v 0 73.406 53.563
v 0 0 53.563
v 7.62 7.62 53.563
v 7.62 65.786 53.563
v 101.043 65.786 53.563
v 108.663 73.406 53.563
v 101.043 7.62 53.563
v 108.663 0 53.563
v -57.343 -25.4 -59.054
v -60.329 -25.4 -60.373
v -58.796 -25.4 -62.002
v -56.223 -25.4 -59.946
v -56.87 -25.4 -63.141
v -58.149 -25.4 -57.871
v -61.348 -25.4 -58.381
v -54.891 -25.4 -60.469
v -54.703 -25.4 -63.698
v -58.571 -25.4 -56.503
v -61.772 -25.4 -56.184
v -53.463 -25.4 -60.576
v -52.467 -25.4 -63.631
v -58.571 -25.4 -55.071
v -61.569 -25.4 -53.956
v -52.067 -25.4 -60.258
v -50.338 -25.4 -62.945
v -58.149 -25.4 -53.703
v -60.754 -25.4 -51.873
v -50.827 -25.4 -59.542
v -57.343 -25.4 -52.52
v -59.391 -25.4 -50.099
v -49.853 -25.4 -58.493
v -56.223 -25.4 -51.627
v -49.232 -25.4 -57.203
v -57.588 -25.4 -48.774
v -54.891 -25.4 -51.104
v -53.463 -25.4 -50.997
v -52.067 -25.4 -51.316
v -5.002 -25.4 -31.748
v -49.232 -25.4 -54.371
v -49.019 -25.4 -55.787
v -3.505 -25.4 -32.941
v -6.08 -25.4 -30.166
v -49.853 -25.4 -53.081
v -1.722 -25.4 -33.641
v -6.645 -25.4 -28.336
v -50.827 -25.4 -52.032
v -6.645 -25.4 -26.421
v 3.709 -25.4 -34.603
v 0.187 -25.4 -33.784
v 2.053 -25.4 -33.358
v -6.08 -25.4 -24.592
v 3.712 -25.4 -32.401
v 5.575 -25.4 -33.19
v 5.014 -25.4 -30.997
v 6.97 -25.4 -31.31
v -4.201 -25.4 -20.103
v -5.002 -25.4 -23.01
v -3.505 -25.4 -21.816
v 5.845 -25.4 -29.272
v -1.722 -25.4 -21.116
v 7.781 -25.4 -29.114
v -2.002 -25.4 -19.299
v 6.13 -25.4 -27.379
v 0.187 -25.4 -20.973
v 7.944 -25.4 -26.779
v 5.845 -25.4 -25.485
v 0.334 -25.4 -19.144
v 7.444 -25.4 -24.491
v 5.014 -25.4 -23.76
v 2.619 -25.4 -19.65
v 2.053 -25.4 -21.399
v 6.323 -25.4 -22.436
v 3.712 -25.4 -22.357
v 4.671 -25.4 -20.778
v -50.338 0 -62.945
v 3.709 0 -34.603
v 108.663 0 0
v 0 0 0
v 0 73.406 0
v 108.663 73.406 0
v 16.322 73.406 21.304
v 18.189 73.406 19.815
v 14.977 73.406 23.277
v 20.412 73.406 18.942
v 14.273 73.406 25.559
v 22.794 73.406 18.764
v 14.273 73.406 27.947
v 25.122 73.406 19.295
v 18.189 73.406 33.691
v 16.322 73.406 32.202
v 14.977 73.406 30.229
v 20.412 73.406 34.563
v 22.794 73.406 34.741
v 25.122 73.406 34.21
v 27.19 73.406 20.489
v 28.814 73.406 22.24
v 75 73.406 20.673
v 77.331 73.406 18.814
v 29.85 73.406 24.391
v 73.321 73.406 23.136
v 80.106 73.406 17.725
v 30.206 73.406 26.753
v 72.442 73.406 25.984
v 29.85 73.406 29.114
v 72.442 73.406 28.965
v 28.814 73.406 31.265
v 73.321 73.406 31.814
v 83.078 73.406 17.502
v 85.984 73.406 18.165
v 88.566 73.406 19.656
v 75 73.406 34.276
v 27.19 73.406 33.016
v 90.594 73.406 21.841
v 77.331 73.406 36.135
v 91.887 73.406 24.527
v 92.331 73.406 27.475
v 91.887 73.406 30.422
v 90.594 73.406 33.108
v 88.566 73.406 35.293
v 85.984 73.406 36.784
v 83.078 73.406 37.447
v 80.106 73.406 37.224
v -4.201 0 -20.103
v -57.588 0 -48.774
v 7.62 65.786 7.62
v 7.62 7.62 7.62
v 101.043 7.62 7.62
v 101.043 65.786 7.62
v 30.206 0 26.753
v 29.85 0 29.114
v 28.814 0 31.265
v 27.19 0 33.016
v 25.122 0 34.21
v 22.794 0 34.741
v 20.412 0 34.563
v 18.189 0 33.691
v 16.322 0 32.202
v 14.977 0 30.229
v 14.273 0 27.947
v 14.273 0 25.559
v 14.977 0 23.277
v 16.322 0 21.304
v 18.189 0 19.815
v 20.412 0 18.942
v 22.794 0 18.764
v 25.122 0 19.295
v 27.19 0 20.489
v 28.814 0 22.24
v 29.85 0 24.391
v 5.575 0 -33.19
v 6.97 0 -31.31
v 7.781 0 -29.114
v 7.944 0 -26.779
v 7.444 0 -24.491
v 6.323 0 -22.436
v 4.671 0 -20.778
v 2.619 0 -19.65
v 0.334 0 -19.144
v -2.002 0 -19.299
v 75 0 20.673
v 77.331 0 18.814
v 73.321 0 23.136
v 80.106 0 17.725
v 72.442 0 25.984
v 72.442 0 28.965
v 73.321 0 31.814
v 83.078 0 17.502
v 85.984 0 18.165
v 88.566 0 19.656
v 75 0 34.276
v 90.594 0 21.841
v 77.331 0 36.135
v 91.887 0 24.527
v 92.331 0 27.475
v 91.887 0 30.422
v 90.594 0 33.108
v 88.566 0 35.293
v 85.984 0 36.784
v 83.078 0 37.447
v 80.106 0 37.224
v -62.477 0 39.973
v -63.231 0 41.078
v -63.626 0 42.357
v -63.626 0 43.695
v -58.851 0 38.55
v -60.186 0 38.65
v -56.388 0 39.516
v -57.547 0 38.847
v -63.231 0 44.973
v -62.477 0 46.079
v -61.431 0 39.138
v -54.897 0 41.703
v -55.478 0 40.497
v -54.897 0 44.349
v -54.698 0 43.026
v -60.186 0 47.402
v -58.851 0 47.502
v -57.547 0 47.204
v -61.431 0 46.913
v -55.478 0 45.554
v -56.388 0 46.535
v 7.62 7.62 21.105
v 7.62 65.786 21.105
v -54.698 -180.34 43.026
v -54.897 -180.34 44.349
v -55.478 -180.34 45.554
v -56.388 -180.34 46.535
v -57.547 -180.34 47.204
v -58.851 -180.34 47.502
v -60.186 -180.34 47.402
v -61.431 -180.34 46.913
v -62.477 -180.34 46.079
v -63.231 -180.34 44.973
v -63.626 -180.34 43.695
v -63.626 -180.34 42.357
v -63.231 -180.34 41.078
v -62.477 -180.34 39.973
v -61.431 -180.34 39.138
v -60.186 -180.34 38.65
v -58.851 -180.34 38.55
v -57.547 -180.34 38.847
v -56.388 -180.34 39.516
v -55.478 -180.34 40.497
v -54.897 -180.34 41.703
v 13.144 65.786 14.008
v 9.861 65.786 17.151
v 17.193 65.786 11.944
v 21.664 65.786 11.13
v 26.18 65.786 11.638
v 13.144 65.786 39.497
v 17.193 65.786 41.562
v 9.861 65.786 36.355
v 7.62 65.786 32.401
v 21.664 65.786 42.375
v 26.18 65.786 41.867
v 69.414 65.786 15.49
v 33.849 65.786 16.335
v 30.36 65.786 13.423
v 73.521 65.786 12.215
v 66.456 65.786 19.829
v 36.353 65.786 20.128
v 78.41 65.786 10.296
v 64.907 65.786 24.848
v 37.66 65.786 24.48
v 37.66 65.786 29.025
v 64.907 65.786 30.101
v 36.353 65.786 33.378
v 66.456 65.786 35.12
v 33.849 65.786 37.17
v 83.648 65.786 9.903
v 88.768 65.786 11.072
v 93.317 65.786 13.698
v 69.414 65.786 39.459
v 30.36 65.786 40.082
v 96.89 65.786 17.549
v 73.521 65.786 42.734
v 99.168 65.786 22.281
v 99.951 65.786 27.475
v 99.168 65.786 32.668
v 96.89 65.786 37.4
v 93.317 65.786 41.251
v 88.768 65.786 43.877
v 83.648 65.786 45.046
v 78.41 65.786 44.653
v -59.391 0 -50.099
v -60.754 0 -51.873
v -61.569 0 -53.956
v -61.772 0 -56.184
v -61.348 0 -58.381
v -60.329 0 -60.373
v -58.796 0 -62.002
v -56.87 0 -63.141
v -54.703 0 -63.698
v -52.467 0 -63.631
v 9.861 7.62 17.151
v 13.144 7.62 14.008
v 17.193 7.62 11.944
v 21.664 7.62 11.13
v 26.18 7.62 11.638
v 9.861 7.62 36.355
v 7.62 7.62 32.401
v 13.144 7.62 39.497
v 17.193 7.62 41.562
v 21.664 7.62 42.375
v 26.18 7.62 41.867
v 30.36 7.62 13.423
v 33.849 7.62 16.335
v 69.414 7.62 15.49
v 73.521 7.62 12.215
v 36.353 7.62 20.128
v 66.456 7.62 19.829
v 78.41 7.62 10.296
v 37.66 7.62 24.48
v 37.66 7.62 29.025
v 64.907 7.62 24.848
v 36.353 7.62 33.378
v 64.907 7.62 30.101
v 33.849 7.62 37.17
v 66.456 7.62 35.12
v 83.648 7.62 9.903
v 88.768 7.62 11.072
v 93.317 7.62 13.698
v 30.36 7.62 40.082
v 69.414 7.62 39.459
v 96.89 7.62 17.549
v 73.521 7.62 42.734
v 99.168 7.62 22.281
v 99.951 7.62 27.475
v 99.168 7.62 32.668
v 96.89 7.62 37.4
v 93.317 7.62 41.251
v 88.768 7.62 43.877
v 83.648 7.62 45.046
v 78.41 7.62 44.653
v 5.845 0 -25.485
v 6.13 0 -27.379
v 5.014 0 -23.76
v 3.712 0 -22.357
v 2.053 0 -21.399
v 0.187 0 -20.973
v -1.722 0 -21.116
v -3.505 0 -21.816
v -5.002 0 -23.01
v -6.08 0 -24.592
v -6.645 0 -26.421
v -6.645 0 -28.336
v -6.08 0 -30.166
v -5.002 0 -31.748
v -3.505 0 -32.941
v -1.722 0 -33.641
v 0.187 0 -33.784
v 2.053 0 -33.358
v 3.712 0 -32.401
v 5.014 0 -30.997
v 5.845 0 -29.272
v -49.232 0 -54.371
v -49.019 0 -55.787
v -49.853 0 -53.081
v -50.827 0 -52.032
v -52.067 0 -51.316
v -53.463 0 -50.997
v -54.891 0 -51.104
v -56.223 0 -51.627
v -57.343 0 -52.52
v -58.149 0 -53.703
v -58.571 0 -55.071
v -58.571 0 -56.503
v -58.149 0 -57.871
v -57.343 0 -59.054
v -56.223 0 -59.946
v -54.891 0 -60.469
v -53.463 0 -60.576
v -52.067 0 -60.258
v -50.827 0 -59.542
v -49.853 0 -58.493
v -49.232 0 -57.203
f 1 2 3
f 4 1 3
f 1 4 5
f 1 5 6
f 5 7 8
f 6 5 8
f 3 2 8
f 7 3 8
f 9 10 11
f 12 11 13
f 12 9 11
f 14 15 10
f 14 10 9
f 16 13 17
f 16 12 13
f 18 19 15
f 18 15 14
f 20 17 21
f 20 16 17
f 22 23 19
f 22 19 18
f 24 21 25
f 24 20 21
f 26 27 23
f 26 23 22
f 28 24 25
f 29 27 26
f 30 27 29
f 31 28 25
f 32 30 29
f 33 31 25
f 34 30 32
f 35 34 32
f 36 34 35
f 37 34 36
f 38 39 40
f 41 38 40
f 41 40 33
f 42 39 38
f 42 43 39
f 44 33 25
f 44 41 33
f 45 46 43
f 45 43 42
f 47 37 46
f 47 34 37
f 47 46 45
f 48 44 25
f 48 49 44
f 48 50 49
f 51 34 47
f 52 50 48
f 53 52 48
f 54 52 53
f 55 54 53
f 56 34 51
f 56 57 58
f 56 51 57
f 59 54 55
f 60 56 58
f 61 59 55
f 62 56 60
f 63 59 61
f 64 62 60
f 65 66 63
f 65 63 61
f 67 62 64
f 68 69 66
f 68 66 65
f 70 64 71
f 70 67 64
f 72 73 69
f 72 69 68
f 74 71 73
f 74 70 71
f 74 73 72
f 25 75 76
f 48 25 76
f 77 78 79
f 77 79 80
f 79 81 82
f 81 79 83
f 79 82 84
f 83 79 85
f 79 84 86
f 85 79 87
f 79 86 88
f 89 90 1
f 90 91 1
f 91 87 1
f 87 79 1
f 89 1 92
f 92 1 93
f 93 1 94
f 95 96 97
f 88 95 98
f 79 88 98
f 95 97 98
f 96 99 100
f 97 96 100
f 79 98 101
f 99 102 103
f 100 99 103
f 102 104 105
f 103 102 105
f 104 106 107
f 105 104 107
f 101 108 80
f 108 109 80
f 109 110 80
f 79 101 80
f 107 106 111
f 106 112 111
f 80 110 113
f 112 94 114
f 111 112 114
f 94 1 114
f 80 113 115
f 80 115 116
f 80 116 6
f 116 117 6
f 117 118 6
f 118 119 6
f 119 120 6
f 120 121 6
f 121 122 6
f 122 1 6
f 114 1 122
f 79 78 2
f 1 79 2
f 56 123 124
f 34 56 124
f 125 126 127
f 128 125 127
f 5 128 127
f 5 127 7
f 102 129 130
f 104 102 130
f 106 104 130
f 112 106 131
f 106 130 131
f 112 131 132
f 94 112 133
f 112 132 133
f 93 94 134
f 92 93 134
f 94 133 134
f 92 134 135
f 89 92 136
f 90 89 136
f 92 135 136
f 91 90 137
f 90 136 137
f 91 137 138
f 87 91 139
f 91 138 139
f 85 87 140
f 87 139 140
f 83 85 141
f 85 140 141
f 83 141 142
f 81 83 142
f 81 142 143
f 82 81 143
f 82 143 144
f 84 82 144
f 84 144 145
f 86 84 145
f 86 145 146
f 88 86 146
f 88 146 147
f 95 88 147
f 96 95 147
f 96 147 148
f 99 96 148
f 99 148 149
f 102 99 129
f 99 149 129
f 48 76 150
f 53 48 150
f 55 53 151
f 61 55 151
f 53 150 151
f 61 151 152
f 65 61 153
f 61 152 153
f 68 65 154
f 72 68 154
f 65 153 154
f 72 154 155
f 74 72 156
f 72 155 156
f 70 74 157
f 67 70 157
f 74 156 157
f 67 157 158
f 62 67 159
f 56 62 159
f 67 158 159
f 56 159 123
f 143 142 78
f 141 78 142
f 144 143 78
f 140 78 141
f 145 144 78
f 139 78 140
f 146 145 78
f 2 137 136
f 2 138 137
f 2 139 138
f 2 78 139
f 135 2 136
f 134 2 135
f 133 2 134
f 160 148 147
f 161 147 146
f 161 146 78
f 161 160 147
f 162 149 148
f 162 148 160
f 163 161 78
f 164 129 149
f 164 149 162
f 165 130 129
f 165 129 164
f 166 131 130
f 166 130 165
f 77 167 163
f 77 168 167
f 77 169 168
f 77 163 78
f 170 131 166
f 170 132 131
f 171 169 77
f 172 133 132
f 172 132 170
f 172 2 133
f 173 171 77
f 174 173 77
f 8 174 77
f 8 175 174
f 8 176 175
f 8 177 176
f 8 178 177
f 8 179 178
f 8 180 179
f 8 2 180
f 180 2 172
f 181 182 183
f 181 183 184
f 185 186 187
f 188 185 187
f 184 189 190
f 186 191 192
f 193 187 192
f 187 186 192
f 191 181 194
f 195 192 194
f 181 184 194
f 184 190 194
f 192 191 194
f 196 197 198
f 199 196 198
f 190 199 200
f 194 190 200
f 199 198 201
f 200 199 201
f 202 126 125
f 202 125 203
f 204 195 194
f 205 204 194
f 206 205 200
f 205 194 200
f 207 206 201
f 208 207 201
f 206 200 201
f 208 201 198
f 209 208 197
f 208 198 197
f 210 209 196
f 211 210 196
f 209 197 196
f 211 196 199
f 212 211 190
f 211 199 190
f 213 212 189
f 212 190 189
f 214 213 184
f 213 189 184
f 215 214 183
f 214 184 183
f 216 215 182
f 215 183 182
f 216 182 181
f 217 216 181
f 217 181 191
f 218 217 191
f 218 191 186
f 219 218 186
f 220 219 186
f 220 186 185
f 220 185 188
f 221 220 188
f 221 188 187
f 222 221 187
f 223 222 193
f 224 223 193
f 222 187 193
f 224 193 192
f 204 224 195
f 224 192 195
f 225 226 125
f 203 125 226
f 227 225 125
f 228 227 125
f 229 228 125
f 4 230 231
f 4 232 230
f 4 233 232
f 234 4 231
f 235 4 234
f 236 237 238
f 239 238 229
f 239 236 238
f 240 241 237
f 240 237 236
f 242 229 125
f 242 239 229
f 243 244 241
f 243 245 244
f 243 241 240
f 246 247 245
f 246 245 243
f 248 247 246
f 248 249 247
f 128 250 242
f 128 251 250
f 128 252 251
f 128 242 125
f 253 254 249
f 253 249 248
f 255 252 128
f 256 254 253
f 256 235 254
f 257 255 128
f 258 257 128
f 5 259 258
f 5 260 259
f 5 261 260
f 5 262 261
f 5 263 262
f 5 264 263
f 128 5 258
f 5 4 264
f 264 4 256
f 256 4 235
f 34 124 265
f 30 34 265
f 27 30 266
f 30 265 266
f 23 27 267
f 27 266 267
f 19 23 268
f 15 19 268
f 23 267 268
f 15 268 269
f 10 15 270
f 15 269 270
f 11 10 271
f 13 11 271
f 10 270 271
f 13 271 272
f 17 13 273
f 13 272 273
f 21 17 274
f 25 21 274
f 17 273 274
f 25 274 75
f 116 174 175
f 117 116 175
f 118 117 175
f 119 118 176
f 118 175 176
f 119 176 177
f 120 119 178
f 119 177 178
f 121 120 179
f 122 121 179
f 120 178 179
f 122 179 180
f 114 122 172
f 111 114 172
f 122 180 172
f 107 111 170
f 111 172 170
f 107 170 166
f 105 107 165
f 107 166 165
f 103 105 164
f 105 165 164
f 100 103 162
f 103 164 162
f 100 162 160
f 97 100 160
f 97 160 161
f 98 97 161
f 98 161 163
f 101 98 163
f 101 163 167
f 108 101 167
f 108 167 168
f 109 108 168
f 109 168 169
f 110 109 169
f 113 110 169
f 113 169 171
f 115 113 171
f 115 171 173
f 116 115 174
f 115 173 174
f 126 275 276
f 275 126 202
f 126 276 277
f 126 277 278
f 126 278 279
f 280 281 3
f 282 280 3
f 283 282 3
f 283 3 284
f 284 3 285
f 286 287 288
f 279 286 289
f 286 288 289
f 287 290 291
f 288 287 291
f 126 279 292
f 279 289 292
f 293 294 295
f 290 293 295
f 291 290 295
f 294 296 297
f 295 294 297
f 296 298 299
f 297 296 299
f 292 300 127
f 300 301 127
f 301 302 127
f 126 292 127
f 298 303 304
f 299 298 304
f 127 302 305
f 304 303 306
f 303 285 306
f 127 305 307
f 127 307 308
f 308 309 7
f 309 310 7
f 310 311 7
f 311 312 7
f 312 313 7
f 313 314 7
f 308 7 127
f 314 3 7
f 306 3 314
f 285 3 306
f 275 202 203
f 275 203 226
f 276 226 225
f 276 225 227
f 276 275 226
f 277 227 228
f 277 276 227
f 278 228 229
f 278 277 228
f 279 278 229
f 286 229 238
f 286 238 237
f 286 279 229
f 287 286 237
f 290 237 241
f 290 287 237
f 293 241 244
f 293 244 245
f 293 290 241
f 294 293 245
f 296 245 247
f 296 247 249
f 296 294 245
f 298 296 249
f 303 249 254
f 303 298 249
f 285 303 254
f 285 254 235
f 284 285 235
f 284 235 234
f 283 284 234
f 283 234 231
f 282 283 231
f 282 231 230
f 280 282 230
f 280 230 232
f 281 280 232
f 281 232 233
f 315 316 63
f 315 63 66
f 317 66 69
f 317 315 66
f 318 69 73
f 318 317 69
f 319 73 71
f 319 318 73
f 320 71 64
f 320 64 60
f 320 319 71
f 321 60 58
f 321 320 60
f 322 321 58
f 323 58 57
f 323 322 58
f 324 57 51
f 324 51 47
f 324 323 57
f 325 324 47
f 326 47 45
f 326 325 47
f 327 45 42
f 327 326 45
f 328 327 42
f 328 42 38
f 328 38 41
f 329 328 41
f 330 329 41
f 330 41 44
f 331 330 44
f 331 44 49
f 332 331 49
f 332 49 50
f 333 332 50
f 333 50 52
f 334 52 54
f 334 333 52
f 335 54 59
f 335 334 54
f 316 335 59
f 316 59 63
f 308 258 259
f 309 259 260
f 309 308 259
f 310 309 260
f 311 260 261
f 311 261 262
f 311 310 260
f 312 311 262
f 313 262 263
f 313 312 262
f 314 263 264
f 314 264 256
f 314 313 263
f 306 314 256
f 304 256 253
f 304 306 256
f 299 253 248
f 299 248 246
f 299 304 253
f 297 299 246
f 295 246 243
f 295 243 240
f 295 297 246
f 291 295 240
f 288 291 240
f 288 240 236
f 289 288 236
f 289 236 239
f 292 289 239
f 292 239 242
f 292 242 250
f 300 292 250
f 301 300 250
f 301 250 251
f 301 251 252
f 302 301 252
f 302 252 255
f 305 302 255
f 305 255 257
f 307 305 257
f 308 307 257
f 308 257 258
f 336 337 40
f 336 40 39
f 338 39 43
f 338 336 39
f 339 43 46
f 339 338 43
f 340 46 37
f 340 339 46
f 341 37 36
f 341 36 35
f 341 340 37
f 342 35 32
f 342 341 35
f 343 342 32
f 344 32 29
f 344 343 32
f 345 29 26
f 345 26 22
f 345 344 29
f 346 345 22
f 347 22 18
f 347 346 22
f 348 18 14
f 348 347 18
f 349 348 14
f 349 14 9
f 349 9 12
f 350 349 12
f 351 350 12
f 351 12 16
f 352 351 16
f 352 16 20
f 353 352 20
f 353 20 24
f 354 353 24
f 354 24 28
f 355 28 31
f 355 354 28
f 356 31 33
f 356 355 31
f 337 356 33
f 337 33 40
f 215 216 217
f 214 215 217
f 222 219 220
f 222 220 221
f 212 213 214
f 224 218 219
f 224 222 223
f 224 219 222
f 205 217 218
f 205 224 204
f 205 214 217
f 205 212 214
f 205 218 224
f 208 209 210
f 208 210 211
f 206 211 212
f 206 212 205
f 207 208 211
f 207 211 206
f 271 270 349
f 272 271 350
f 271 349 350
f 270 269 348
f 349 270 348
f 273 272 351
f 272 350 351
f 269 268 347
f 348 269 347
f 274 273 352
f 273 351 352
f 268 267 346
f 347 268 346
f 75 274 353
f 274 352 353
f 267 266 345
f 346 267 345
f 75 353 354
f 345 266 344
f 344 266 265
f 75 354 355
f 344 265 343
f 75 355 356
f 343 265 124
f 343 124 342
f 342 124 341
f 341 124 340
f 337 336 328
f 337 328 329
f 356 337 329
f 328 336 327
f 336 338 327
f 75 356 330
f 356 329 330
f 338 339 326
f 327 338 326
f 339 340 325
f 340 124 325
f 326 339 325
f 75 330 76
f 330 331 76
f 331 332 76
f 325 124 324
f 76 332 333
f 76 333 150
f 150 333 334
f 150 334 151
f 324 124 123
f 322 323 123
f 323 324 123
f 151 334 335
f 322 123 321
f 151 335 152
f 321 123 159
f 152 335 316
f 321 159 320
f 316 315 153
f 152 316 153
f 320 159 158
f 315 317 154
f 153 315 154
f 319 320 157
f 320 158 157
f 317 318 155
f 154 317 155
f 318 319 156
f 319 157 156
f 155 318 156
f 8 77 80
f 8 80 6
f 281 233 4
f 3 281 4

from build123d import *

# Parameters (mm, degrees)
F0_W     = 108.6633130908
F0_H     = 53.5634607077
F0_R     = 8.0111805039
F0_R_2   = 10.0003279272
F1_DEPTH = 73.406
F2_T     = -7.62
F3_R     = 4.4888128734
F4_DEPTH = 180.34
F5_R     = 4.802952677
F5_R_2   = 6.4232426475
F6_DEPTH = 25.4


with BuildPart() as f1:
    # F0 (on Front) → F1 (new body)
    with BuildSketch(Plane.XZ):
        with Locations((54.3316565454, 26.7817303538)):
            Rectangle(F0_W, F0_H)
        with Locations((22.1950598061, 26.7526358366)):
            Circle(F0_R, mode=Mode.SUBTRACT)
        with Locations((82.3309123516, 27.4745319039)):
            Circle(F0_R_2, mode=Mode.SUBTRACT)
    extrude(amount=-F1_DEPTH)

    # F2
    f2_openings = [f1.faces().sort_by_distance(p)[0] for p in [
        (54.331657, 36.703, 53.563461),
    ]]
    offset(amount=F2_T, openings=f2_openings, kind=Kind.INTERSECTION)


with BuildPart() as f4:
    # F3 (on Front) → F4 (new body)
    with BuildSketch(Plane.XZ):
        with Locations((-59.1868311167, 43.025854975)):
            Circle(F3_R)
    extrude(amount=F4_DEPTH)


with BuildPart() as f6:
    # F5 (on Front) → F6 (new body)
    with BuildSketch(Plane.XZ):
        with BuildLine():
            Line((-4.2006061412, -20.1027095318), (-57.5881265104, -48.7737841904))
            ThreePointArc((-57.5881265104, -48.7737841904), (-60.9086076306, -59.4127066545), (-50.3379702568, -62.9445463419))
            Line((-50.3379702568, -62.9445463419), (3.7086585071, -34.6030220389))
            ThreePointArc((3.7086585071, -34.6030220389), (6.9571331768, -23.4238967044), (-4.2006061412, -20.1027095318))
        make_face()
        with Locations((-53.8218191704, -55.7869084706)):
            Circle(F5_R, mode=Mode.SUBTRACT)
        with Locations((-0.2931767349, -27.3786128421)):
            Circle(F5_R_2, mode=Mode.SUBTRACT)
    extrude(amount=F6_DEPTH)


solid = Compound([f1.part, f4.part, f6.part])
